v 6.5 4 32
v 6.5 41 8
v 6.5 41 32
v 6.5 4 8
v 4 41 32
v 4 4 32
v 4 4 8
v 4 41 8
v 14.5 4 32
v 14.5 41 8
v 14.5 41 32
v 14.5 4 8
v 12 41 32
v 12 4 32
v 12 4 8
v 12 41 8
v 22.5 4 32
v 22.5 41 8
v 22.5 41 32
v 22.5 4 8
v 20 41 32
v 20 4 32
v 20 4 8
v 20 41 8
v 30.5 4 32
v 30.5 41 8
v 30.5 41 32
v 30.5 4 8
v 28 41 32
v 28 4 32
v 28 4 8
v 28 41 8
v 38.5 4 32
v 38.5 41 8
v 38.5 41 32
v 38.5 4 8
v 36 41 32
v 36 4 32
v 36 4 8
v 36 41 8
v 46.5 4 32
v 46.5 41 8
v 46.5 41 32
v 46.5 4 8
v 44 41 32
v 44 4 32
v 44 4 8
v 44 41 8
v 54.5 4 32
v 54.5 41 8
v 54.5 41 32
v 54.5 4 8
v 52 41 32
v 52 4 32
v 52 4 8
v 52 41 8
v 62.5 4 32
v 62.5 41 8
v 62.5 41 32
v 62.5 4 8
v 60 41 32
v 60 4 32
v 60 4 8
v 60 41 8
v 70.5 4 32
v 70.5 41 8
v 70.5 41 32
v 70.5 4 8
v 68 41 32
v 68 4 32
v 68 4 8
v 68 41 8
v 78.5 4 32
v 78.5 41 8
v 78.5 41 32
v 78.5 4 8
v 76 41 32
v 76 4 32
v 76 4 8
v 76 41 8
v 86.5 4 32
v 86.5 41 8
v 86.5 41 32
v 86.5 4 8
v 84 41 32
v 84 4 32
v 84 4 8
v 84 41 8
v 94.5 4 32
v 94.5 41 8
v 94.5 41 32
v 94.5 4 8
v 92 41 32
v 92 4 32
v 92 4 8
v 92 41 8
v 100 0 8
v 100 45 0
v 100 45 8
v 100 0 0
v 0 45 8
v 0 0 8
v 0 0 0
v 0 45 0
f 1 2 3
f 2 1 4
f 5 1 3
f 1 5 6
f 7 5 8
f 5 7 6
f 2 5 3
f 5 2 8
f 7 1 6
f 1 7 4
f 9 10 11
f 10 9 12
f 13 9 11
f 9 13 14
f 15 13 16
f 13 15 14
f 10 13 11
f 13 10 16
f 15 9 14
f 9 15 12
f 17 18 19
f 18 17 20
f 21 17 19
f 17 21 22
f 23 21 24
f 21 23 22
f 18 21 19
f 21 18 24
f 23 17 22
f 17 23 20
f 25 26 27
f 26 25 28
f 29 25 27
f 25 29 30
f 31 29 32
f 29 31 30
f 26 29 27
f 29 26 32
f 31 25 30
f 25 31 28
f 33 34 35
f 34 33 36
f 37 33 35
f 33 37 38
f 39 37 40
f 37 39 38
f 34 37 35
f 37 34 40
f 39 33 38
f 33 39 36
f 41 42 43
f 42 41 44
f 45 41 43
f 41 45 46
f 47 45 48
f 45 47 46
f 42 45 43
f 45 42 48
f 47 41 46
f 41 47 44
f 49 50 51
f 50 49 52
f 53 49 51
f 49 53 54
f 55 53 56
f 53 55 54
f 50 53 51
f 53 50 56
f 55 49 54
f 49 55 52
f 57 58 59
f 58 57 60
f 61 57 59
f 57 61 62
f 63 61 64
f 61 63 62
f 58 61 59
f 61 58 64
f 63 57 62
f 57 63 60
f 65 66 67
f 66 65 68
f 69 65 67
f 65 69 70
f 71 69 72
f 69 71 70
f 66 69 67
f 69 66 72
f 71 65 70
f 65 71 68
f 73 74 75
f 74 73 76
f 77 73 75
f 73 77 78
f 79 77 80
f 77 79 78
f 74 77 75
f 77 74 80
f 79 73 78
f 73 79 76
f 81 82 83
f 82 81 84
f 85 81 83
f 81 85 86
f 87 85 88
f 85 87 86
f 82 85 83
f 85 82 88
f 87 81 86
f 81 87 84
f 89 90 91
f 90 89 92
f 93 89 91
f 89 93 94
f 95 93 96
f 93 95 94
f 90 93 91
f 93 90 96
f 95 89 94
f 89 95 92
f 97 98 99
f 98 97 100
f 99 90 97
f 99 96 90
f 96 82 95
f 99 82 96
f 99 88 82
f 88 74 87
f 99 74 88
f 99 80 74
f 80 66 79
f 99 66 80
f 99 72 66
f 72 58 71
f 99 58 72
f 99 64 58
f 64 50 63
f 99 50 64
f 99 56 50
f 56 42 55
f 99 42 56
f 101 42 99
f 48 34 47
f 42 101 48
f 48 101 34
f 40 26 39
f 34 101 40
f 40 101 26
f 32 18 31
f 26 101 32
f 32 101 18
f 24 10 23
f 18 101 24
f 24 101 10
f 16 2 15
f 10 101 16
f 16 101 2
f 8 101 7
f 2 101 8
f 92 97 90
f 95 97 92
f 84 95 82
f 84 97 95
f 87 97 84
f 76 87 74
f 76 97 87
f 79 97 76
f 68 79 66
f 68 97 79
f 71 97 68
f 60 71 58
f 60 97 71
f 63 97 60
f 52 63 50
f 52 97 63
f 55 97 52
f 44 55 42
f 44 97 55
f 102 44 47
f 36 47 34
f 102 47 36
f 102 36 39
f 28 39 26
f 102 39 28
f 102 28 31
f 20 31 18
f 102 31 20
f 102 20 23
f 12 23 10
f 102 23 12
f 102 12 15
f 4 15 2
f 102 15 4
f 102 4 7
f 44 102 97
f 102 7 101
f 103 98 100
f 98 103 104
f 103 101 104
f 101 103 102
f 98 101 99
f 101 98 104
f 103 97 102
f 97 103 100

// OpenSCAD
$fn = 32;

// ----------------------------------------------------------------------
// Heatsink: uniform fin block
// ----------------------------------------------------------------------

// --- parameters (mm) ---
base_l = 100;             // base length, X
base_w = 45;              // base width, Y
base_t = 8;               // base plate thickness
fin_h = 25;               // fin height above the base
fin_t = 2.5;              // fin thickness
edge = 4;                 // margin from the base ends
pitch = 8;                // fin pitch
fit_tol = 0.02;           // tolerance for press fits, mm
free_tol = 0.2;           // tolerance for clearance fits, mm

n_fins = floor((base_l - 2 * edge - fin_t) / pitch) + 1;  // fin count
total_h = base_t + fin_h - 1;  // overall height

union() {
  cube([base_l, base_w, base_t]);
  for (i = [0 : n_fins - 1])
    translate([edge + i * pitch, edge, base_t - 1])
      cube([fin_t, base_w - 2 * edge, fin_h]);
}
